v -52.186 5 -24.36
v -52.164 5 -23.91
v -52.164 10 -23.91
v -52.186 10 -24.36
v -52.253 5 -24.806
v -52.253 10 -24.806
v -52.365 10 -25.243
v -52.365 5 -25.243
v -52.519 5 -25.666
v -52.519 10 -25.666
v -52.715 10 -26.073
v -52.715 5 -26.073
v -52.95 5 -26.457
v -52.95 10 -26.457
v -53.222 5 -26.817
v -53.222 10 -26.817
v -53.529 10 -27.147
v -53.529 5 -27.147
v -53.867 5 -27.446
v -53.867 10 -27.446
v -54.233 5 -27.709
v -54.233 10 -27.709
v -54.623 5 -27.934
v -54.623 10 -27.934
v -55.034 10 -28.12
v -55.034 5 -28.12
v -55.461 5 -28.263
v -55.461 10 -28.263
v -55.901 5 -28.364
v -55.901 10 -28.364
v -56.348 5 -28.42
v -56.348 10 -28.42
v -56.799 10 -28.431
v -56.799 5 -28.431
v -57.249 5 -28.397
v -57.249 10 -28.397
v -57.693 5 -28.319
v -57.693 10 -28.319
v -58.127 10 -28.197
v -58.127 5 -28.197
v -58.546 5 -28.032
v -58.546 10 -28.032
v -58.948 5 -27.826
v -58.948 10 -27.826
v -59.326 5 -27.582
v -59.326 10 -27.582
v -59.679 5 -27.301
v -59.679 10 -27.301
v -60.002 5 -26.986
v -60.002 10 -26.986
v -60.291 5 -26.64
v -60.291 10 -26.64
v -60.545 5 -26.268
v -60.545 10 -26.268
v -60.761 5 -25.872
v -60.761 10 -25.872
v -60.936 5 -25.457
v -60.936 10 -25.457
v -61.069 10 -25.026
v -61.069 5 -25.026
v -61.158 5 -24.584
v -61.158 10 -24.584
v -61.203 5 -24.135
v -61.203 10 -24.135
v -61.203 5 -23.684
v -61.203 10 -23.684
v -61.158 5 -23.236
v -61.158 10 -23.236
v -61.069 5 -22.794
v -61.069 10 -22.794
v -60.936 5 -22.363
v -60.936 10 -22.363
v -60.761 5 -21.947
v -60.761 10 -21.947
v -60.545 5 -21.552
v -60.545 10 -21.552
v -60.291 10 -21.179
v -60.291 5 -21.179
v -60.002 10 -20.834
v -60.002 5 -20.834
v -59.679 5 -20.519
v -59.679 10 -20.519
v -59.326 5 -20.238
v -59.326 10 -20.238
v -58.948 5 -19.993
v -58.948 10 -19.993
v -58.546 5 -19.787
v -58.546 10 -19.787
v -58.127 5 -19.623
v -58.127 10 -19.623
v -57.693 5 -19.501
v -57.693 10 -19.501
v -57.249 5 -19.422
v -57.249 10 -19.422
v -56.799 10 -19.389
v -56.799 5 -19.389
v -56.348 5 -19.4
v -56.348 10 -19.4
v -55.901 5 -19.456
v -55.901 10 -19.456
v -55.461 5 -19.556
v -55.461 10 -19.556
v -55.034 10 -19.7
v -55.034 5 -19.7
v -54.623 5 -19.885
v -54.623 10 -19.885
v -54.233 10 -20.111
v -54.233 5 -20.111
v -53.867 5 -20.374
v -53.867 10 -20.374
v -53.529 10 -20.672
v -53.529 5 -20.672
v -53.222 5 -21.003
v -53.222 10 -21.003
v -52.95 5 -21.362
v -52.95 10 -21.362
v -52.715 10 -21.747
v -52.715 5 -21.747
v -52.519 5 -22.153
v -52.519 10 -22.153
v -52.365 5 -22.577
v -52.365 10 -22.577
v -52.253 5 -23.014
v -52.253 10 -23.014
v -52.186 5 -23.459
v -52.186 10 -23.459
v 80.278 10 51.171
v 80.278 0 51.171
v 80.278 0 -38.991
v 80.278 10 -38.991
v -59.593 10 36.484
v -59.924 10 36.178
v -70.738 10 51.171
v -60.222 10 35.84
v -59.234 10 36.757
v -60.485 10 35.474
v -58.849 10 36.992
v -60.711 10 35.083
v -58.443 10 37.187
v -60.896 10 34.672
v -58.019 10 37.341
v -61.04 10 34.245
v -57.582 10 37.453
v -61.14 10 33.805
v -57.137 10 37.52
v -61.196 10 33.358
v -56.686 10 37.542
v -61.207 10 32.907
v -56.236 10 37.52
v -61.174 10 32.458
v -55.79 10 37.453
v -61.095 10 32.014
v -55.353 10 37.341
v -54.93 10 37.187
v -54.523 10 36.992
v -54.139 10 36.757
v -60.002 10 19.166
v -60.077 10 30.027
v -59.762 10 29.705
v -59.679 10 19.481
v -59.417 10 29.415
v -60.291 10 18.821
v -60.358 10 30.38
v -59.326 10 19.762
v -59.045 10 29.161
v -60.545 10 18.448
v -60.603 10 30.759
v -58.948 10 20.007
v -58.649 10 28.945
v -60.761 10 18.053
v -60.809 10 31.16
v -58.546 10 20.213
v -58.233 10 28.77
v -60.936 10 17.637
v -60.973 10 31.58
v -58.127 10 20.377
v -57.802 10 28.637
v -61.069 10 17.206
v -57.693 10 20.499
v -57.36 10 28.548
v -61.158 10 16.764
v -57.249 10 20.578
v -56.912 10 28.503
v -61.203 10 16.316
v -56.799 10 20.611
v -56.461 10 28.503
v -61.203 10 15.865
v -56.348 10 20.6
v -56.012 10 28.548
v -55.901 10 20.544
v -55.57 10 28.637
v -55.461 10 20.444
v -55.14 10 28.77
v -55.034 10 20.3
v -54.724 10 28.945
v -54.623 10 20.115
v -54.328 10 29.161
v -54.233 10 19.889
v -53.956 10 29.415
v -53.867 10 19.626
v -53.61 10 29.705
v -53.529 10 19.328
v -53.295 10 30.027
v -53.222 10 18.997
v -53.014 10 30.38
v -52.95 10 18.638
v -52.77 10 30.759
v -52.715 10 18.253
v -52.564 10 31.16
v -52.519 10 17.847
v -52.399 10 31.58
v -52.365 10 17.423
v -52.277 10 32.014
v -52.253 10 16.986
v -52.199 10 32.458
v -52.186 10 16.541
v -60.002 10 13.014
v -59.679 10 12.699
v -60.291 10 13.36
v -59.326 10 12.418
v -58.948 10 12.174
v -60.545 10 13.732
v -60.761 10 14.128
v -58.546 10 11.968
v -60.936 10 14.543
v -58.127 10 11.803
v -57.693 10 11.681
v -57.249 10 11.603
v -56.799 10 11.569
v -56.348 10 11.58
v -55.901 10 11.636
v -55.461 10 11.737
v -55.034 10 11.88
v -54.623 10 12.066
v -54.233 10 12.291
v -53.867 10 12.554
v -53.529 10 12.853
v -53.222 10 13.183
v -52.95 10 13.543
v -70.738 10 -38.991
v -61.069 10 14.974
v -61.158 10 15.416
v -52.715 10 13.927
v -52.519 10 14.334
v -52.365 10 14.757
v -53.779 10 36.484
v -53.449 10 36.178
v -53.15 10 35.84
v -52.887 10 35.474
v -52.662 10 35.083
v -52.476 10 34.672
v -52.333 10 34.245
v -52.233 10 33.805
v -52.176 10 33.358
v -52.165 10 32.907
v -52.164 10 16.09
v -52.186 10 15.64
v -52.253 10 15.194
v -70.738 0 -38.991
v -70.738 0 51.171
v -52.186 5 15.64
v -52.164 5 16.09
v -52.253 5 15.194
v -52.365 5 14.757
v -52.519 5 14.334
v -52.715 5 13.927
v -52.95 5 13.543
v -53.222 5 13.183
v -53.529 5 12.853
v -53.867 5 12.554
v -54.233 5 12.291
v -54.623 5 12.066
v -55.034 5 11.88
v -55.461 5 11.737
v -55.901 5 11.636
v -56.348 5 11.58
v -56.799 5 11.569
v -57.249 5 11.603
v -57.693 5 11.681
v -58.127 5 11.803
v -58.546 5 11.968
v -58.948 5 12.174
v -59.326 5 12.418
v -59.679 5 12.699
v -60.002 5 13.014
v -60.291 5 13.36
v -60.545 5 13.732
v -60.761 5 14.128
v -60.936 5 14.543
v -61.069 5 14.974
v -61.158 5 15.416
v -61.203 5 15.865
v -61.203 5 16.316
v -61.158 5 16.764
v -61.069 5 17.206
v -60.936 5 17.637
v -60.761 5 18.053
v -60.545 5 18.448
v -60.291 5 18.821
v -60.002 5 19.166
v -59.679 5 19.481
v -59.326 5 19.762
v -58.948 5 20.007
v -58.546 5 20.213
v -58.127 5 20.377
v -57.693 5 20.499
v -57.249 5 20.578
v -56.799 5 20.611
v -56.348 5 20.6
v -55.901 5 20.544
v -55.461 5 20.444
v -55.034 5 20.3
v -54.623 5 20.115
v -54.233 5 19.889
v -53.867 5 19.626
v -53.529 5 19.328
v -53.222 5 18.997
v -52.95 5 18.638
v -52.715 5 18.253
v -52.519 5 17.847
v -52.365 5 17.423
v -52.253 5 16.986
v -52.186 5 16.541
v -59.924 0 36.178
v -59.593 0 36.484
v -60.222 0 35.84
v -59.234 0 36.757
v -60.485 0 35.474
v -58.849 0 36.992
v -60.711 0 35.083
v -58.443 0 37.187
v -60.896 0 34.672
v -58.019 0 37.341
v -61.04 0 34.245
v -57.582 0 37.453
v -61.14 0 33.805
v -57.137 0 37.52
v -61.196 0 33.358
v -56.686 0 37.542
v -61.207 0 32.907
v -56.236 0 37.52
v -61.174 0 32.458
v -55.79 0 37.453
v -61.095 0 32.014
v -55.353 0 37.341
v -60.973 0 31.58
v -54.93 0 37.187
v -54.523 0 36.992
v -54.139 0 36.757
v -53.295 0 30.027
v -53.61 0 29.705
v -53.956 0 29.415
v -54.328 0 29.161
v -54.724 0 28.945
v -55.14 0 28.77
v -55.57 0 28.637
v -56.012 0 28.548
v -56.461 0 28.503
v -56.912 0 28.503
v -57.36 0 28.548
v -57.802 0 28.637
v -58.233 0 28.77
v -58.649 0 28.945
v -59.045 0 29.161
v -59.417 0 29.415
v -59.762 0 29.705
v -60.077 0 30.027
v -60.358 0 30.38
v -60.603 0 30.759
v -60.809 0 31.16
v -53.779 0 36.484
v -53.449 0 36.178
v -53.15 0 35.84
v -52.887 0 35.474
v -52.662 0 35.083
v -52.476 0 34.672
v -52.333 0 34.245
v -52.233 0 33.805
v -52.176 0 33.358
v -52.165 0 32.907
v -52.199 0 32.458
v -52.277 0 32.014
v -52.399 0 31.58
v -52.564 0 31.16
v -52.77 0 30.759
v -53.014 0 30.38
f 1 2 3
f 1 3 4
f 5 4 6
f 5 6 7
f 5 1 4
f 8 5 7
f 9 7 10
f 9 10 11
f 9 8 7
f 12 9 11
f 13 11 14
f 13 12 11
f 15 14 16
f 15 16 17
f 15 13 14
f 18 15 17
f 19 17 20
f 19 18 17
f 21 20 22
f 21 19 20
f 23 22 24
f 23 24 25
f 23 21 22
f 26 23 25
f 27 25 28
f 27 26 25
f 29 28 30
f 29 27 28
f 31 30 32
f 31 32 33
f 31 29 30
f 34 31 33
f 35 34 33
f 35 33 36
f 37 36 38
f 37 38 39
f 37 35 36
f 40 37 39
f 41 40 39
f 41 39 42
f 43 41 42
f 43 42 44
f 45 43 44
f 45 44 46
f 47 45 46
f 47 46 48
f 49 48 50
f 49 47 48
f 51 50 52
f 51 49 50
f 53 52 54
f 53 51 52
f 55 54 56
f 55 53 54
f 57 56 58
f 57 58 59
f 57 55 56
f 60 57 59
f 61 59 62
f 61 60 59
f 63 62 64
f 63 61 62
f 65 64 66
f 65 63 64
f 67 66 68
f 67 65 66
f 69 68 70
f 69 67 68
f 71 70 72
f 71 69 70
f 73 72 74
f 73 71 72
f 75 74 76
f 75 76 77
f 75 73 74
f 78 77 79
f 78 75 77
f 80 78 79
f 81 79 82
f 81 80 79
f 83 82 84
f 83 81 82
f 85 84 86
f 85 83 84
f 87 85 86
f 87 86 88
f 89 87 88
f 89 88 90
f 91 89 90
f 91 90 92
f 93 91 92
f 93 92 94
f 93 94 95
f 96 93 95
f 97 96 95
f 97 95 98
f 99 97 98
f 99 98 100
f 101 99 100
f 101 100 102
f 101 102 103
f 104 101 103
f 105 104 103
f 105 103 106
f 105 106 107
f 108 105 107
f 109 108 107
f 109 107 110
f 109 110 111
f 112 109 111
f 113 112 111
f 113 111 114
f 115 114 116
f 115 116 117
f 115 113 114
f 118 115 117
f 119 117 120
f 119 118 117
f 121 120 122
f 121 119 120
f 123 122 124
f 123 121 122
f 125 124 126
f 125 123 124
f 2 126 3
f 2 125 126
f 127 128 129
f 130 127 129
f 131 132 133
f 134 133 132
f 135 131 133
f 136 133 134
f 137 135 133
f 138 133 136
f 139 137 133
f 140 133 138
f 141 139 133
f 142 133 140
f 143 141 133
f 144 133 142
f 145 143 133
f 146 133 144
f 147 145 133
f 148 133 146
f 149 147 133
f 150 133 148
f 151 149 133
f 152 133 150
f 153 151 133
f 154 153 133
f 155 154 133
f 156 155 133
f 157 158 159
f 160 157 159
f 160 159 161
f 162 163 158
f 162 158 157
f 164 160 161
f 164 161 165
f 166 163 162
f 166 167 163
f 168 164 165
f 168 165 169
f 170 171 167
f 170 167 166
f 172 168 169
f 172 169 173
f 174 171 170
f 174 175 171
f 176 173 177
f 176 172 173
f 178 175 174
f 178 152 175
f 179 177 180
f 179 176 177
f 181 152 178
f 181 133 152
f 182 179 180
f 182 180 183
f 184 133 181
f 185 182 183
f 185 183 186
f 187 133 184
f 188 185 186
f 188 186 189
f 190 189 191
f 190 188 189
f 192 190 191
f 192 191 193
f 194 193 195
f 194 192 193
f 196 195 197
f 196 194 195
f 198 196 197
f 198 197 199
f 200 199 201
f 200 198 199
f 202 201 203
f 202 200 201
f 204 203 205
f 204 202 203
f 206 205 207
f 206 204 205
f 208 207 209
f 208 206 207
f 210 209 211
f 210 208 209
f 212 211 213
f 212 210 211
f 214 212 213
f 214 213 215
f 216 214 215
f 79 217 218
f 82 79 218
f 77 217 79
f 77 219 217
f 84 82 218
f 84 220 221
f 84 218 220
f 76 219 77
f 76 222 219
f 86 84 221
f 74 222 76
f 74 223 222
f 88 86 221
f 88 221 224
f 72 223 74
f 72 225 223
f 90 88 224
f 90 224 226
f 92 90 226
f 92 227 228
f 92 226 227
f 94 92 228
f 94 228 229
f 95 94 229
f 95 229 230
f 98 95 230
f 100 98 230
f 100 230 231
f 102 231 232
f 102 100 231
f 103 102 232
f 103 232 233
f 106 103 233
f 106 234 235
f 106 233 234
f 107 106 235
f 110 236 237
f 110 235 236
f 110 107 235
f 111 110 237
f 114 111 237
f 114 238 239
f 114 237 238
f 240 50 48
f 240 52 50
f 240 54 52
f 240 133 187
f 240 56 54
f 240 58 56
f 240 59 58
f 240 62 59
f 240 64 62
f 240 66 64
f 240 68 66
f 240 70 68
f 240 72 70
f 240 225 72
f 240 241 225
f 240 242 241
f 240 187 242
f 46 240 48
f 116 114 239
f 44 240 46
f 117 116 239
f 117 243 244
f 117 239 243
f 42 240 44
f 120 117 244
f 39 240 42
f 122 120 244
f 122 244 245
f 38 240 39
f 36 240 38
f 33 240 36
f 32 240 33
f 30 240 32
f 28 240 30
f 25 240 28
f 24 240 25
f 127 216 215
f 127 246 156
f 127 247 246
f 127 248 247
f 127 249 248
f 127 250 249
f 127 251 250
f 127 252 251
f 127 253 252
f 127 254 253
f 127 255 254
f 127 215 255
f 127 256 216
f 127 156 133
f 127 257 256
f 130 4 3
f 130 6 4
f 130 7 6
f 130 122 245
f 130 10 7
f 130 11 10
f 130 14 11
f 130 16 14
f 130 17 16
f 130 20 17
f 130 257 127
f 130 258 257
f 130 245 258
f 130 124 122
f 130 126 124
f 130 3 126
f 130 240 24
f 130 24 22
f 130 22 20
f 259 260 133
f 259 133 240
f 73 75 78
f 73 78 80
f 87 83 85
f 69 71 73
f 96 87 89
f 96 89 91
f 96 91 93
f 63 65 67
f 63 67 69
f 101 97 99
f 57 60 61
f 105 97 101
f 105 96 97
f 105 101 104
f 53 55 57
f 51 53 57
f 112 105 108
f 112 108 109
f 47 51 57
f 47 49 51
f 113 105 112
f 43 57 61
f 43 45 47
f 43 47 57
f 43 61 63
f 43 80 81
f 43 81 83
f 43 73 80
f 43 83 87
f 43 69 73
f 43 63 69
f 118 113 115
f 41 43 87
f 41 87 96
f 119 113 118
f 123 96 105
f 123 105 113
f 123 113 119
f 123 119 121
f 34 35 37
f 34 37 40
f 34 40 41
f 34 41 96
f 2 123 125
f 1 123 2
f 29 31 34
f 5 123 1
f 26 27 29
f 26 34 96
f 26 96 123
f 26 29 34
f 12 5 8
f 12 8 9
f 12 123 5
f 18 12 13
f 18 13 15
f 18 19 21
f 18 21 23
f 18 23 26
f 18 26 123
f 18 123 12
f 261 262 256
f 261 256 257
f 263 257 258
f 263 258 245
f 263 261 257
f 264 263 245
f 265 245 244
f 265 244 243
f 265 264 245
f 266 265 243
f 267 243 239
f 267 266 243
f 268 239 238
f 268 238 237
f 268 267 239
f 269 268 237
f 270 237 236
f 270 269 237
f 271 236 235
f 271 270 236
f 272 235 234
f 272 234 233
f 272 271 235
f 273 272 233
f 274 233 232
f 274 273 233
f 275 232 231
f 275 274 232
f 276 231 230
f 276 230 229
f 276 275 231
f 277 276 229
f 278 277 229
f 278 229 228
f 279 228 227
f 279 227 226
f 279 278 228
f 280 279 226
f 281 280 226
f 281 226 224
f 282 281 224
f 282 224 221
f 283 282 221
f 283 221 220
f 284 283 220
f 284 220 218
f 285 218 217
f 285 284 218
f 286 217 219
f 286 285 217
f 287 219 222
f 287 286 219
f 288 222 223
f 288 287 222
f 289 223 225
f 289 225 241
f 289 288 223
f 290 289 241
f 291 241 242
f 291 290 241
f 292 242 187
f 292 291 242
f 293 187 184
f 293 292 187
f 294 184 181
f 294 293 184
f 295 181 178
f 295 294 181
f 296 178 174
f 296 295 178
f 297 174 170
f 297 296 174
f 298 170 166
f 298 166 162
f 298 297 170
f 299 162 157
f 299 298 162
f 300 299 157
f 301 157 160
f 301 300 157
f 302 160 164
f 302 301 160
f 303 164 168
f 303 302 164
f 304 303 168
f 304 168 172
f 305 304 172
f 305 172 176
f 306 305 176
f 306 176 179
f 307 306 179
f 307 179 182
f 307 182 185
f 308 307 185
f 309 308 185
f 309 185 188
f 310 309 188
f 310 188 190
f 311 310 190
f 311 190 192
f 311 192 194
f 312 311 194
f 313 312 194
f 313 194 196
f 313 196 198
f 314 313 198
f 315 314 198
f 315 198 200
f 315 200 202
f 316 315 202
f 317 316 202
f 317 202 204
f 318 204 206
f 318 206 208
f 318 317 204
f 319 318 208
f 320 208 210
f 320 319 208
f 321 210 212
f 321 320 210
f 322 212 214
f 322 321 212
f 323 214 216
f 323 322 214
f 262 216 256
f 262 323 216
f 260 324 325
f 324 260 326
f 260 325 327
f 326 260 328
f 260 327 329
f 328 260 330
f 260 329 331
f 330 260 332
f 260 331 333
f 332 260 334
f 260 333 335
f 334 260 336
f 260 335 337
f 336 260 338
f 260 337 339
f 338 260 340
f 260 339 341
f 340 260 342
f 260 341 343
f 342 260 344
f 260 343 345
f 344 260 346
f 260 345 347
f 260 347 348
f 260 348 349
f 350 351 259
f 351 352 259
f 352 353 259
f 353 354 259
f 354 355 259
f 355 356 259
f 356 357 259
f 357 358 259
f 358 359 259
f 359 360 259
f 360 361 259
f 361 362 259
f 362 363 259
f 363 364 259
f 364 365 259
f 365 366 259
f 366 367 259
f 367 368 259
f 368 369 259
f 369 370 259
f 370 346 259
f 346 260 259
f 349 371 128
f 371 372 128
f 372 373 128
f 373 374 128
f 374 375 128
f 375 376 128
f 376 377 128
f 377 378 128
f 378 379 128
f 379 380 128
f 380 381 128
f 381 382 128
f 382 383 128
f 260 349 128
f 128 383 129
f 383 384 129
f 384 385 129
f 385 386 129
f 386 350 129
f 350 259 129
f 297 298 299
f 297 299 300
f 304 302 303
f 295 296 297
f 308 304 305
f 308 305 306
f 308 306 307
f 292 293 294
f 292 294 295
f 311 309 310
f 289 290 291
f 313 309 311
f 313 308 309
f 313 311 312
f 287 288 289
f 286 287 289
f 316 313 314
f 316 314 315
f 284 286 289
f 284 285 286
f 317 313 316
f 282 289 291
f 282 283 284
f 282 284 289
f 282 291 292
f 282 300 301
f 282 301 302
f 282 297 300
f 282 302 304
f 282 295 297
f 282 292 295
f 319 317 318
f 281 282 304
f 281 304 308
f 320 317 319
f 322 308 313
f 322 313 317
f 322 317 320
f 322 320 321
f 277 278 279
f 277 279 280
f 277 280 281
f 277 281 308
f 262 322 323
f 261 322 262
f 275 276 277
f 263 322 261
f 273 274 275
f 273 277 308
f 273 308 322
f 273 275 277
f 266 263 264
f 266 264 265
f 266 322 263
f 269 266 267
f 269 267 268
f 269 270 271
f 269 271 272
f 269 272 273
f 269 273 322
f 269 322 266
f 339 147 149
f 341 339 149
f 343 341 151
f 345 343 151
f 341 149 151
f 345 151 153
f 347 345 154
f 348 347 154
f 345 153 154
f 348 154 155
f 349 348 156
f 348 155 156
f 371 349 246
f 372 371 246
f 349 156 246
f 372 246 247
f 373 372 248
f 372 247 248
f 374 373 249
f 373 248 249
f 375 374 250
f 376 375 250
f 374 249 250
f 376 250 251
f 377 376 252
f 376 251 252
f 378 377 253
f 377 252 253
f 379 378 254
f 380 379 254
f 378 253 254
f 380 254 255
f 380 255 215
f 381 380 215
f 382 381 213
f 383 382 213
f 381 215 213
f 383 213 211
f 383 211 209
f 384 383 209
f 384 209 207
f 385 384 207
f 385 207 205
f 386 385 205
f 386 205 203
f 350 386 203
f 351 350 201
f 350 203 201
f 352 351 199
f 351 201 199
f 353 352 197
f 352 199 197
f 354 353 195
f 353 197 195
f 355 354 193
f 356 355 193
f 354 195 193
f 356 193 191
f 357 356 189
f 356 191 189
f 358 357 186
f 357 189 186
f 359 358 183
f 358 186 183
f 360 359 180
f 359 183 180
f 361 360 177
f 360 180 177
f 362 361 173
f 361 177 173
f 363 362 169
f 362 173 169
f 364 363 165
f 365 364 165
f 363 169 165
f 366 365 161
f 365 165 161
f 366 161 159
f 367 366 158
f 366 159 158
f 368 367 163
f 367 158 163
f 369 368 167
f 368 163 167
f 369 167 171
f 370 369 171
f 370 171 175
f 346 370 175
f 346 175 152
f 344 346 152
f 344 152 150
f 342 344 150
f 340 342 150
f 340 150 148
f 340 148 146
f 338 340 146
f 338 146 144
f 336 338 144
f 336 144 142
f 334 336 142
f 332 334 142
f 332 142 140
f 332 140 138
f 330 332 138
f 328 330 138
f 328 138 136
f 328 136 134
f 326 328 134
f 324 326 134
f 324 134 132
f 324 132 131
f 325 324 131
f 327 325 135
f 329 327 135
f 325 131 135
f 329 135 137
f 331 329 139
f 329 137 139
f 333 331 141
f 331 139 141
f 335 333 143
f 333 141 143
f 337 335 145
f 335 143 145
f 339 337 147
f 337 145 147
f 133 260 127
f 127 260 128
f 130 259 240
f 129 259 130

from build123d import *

# Parameters (mm, degrees)
SKETCH1_W           = 151.015799324
SKETCH1_H           = 90.161719468
BOSS_EXTRUDE1_DEPTH = 10
SKETCH2_R           = 4.522511264
CUT_EXTRUDE1_DEPTH  = 10
TPATTERN1_START     = 5
TPATTERN1_OUTLINE_R = 4.522511264
TPATTERN1_DEPTH     = 5


# Read off the part's stored shape, not the designer's step: TPattern1
with BuildPart() as part:
    # Sketch1 → Boss-Extrude1 (new body)
    with BuildSketch(Plane(origin=(0, 0, 0), x_dir=(1, 0, 0), z_dir=(0, 1, 0))):
        with Locations((4.769946885, -6.090262952)):
            Rectangle(SKETCH1_W, SKETCH1_H)
    extrude(amount=BOSS_EXTRUDE1_DEPTH)

    # Sketch2 → Cut-Extrude1 (cut)
    with BuildSketch(Plane(origin=(0, 10, 0), x_dir=(-1, 0, 0), z_dir=(0, 1, 0))):
        with Locations(Location((56.686327356, 33.019898718, 0), (0, 0, 90))):
            Circle(SKETCH2_R)
    extrude(amount=-CUT_EXTRUDE1_DEPTH, mode=Mode.SUBTRACT)

    # TPattern1 outline → TPattern1 (cut)
    with BuildSketch(Plane(origin=(0, 0, 0), x_dir=(1, 0, 0), z_dir=(0, 1, 0)).offset(TPATTERN1_START)):
        with Locations((-56.686327356, -16.090262952)):
            Circle(TPATTERN1_OUTLINE_R)
        with Locations((-56.686327356, 23.909737048)):
            Circle(TPATTERN1_OUTLINE_R)
    extrude(amount=TPATTERN1_DEPTH, mode=Mode.SUBTRACT)


solid = part.part
